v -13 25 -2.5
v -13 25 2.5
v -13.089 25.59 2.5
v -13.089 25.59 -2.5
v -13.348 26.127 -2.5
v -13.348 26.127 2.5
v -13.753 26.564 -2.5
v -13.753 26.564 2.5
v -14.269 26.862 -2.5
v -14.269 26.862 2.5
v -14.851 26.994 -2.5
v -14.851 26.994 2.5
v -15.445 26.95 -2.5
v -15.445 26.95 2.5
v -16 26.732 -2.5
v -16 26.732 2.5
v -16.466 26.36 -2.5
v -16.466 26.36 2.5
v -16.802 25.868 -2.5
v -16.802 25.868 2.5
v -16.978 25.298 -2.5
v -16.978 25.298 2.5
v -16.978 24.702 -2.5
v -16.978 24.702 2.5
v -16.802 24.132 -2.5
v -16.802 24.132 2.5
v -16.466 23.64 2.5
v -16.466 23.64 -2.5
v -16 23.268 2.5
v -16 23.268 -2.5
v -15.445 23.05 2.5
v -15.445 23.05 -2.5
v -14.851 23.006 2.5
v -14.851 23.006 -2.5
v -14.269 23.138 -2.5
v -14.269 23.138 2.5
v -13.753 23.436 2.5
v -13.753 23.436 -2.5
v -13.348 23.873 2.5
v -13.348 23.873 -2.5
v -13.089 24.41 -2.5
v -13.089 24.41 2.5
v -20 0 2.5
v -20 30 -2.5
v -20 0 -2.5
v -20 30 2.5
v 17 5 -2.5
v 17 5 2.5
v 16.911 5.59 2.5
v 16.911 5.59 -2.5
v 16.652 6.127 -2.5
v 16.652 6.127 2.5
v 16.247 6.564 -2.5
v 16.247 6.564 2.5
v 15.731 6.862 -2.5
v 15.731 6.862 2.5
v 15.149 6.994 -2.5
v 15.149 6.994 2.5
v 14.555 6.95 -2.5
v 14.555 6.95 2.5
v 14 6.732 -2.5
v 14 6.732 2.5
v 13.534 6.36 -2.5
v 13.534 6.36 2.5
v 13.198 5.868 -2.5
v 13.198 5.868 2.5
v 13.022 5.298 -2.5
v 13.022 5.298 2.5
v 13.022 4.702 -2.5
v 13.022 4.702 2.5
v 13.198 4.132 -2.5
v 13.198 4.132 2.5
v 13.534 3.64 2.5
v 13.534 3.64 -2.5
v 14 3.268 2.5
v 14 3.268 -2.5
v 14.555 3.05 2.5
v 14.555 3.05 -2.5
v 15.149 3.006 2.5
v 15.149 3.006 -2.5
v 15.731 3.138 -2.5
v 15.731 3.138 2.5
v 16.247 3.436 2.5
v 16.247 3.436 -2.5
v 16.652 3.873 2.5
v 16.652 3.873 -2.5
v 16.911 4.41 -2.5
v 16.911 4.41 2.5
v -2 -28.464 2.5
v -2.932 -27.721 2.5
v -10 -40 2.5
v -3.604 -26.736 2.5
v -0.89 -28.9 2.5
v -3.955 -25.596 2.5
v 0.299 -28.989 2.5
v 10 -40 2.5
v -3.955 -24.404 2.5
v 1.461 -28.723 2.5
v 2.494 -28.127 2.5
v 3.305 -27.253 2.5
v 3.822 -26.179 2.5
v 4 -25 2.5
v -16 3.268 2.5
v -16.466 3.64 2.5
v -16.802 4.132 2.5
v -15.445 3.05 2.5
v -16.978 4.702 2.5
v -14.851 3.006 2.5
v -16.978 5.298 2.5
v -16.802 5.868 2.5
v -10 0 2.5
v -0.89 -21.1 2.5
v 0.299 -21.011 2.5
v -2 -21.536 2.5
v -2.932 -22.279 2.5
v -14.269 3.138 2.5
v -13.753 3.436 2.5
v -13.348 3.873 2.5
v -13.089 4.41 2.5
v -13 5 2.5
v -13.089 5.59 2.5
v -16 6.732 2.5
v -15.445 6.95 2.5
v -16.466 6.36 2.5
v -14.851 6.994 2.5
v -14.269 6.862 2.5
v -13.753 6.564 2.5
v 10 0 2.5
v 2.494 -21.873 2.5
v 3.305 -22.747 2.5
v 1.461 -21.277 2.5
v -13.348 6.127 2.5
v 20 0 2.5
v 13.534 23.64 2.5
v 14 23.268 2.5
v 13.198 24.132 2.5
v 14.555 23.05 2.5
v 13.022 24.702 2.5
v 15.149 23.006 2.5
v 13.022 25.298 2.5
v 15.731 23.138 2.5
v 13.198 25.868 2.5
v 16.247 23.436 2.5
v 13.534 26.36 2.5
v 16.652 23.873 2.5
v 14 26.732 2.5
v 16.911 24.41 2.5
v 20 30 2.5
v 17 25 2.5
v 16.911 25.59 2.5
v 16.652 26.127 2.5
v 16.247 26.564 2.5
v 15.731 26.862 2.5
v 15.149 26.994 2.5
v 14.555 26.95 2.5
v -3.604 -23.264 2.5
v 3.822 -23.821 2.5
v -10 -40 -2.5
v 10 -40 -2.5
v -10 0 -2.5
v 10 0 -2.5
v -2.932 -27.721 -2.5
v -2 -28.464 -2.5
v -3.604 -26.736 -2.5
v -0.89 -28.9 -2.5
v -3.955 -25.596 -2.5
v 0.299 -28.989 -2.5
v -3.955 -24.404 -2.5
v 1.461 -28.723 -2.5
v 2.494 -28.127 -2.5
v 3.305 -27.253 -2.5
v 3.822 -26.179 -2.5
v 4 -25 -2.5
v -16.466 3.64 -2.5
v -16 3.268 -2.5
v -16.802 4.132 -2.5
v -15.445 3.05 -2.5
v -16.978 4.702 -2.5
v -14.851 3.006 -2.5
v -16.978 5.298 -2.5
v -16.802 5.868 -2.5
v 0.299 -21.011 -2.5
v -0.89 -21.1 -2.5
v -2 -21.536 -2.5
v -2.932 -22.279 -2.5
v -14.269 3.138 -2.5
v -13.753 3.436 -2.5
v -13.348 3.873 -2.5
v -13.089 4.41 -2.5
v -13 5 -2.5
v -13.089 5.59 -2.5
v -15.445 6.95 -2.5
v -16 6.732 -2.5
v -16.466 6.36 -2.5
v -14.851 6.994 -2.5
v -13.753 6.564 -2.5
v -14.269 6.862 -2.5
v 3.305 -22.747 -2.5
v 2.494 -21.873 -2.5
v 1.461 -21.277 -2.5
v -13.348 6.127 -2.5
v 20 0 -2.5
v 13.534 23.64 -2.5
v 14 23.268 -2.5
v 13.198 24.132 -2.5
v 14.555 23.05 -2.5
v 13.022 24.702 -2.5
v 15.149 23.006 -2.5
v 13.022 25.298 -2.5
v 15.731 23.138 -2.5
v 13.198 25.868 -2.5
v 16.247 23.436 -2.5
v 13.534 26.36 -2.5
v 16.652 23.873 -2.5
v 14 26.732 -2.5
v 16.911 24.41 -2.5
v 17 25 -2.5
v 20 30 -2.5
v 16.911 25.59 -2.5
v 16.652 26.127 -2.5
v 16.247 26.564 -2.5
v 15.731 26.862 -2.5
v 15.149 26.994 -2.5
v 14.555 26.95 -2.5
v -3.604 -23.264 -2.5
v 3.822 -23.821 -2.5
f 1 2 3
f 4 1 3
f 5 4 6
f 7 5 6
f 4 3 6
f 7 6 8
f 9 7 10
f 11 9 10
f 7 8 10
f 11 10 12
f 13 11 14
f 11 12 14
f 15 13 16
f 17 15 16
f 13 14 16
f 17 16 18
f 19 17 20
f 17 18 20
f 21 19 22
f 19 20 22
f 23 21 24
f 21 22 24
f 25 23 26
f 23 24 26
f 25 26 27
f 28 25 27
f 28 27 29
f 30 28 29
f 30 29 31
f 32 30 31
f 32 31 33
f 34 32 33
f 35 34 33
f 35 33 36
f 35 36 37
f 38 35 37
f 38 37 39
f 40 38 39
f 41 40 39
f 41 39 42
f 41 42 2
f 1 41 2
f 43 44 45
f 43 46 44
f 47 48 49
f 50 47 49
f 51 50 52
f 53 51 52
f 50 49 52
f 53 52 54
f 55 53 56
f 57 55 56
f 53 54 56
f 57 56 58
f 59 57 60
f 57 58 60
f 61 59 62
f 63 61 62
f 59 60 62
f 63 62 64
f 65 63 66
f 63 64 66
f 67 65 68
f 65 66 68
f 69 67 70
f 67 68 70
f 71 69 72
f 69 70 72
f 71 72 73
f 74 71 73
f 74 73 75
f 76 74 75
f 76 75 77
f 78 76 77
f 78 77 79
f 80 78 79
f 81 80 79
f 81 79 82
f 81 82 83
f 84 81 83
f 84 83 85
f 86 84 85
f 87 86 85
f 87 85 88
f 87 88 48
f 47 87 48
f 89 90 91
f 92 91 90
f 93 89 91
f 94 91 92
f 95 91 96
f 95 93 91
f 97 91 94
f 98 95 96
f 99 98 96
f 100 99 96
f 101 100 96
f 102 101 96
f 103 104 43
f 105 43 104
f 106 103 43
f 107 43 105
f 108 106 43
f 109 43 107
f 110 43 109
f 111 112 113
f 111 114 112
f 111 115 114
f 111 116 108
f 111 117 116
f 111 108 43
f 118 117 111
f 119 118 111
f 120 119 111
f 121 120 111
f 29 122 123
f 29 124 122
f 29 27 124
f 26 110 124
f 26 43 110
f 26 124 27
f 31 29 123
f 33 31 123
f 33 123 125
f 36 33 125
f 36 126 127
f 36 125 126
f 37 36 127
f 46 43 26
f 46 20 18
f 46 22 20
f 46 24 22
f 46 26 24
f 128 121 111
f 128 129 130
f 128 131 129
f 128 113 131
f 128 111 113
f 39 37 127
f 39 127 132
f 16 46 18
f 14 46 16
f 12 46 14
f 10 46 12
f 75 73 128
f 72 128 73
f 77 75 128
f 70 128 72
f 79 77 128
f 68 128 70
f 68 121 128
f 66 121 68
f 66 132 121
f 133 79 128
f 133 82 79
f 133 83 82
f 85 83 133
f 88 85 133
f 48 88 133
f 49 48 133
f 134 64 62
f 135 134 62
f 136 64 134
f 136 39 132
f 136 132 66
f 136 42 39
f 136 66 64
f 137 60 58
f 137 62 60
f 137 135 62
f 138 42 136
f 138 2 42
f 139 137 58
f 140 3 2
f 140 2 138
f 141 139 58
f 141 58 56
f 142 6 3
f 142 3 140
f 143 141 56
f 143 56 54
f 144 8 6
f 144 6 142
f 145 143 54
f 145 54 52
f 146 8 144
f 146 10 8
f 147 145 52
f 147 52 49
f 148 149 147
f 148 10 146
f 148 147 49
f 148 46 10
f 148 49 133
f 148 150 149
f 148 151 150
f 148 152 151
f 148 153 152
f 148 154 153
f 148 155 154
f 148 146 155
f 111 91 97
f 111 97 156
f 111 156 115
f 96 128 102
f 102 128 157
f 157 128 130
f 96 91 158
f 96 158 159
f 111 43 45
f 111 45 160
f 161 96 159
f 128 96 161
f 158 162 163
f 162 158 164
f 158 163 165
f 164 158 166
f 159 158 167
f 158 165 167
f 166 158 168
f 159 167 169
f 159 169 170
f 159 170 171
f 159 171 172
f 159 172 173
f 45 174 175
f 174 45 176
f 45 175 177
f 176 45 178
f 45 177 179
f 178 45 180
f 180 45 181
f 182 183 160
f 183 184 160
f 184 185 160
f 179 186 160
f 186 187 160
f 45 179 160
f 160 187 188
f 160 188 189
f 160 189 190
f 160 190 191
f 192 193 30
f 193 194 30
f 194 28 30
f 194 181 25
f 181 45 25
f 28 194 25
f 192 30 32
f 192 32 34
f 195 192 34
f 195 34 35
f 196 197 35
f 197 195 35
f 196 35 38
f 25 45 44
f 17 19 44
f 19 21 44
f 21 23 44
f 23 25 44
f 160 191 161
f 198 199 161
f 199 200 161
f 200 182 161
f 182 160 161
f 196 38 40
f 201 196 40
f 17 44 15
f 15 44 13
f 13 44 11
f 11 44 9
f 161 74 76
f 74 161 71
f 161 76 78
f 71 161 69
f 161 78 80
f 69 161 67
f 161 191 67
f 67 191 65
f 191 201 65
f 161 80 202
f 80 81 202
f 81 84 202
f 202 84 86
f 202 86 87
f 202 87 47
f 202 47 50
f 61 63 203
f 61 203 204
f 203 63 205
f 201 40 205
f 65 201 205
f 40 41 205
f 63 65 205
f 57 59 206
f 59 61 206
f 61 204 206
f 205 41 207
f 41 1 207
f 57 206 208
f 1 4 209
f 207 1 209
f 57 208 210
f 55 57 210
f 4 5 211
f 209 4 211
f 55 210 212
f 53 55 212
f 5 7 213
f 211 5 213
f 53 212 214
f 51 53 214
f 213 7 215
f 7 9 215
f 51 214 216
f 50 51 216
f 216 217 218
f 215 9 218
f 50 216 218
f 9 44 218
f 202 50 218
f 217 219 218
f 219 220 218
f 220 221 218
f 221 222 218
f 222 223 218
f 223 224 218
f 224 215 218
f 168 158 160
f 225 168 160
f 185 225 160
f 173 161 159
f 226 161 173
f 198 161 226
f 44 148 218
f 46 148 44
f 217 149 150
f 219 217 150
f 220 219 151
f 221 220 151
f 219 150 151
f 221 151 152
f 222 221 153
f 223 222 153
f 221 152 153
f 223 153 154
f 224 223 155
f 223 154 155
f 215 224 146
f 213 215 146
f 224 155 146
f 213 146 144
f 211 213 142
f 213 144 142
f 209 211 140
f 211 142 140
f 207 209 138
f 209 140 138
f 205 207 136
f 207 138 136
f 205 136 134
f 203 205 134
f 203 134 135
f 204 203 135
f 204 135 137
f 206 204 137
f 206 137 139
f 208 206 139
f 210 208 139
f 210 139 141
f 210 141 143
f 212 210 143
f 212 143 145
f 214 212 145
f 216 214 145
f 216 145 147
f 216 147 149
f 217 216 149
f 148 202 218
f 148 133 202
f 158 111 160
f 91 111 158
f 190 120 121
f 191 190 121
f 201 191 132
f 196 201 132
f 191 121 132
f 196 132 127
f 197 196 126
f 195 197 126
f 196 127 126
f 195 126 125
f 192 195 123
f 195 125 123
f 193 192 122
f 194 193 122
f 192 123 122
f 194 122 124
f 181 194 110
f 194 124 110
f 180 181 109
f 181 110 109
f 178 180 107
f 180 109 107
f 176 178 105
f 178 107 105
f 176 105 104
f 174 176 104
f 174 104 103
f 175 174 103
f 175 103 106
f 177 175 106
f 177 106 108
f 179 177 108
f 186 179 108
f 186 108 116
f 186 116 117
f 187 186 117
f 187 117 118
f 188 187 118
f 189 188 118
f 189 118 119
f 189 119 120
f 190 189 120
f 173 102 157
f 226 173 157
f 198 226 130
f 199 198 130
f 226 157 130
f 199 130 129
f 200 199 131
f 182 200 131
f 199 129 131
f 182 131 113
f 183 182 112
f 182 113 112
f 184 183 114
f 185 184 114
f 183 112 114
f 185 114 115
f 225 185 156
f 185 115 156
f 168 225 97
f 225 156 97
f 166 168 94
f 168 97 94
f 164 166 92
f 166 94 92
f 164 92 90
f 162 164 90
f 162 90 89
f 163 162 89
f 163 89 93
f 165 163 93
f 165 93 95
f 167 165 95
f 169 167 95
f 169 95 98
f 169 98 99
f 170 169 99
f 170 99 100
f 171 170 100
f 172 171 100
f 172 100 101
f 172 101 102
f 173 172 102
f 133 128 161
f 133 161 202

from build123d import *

# Parameters (mm, degrees)
BOSS_EXTRUDE1_DEPTH = 2.5
SKETCH2_R           = 2.5
SKETCH2_R_2         = 4
CUT_EXTRUDE1_DEPTH  = 46
SKETCH3_R           = 2
CUT_EXTRUDE2_DEPTH  = 10


with BuildPart() as part:
    # Sketch1 → Boss-Extrude1 (new, symmetric)
    with BuildSketch(Plane.XY):
        Polygon((-20, 30), (-20, 0), (-10, 0), (-10, -40), (10, -40), (10, 0), (20, 0), (20, 30), align=None)
    extrude(amount=BOSS_EXTRUDE1_DEPTH, both=True)

    # Sketch2 → Cut-Extrude1 (cut, through all)
    with BuildSketch(Plane.XY.offset(2.5)):
        with Locations((-25, 20)):
            Circle(SKETCH2_R)
        with Locations((25, 20)):
            Circle(SKETCH2_R)
        with Locations((0, -25)):
            Circle(SKETCH2_R_2)
    extrude(amount=-CUT_EXTRUDE1_DEPTH, mode=Mode.SUBTRACT)

    # Sketch3 → Cut-Extrude2 (cut)
    with BuildSketch(Plane.XY.offset(2.5)):
        with Locations((-15, 25)):
            Circle(SKETCH3_R)
        with Locations((15, 25)):
            Circle(SKETCH3_R)
        with Locations((15, 5)):
            Circle(SKETCH3_R)
        with Locations((-15, 5)):
            Circle(SKETCH3_R)
    extrude(amount=-CUT_EXTRUDE2_DEPTH, mode=Mode.SUBTRACT)


solid = part.part
